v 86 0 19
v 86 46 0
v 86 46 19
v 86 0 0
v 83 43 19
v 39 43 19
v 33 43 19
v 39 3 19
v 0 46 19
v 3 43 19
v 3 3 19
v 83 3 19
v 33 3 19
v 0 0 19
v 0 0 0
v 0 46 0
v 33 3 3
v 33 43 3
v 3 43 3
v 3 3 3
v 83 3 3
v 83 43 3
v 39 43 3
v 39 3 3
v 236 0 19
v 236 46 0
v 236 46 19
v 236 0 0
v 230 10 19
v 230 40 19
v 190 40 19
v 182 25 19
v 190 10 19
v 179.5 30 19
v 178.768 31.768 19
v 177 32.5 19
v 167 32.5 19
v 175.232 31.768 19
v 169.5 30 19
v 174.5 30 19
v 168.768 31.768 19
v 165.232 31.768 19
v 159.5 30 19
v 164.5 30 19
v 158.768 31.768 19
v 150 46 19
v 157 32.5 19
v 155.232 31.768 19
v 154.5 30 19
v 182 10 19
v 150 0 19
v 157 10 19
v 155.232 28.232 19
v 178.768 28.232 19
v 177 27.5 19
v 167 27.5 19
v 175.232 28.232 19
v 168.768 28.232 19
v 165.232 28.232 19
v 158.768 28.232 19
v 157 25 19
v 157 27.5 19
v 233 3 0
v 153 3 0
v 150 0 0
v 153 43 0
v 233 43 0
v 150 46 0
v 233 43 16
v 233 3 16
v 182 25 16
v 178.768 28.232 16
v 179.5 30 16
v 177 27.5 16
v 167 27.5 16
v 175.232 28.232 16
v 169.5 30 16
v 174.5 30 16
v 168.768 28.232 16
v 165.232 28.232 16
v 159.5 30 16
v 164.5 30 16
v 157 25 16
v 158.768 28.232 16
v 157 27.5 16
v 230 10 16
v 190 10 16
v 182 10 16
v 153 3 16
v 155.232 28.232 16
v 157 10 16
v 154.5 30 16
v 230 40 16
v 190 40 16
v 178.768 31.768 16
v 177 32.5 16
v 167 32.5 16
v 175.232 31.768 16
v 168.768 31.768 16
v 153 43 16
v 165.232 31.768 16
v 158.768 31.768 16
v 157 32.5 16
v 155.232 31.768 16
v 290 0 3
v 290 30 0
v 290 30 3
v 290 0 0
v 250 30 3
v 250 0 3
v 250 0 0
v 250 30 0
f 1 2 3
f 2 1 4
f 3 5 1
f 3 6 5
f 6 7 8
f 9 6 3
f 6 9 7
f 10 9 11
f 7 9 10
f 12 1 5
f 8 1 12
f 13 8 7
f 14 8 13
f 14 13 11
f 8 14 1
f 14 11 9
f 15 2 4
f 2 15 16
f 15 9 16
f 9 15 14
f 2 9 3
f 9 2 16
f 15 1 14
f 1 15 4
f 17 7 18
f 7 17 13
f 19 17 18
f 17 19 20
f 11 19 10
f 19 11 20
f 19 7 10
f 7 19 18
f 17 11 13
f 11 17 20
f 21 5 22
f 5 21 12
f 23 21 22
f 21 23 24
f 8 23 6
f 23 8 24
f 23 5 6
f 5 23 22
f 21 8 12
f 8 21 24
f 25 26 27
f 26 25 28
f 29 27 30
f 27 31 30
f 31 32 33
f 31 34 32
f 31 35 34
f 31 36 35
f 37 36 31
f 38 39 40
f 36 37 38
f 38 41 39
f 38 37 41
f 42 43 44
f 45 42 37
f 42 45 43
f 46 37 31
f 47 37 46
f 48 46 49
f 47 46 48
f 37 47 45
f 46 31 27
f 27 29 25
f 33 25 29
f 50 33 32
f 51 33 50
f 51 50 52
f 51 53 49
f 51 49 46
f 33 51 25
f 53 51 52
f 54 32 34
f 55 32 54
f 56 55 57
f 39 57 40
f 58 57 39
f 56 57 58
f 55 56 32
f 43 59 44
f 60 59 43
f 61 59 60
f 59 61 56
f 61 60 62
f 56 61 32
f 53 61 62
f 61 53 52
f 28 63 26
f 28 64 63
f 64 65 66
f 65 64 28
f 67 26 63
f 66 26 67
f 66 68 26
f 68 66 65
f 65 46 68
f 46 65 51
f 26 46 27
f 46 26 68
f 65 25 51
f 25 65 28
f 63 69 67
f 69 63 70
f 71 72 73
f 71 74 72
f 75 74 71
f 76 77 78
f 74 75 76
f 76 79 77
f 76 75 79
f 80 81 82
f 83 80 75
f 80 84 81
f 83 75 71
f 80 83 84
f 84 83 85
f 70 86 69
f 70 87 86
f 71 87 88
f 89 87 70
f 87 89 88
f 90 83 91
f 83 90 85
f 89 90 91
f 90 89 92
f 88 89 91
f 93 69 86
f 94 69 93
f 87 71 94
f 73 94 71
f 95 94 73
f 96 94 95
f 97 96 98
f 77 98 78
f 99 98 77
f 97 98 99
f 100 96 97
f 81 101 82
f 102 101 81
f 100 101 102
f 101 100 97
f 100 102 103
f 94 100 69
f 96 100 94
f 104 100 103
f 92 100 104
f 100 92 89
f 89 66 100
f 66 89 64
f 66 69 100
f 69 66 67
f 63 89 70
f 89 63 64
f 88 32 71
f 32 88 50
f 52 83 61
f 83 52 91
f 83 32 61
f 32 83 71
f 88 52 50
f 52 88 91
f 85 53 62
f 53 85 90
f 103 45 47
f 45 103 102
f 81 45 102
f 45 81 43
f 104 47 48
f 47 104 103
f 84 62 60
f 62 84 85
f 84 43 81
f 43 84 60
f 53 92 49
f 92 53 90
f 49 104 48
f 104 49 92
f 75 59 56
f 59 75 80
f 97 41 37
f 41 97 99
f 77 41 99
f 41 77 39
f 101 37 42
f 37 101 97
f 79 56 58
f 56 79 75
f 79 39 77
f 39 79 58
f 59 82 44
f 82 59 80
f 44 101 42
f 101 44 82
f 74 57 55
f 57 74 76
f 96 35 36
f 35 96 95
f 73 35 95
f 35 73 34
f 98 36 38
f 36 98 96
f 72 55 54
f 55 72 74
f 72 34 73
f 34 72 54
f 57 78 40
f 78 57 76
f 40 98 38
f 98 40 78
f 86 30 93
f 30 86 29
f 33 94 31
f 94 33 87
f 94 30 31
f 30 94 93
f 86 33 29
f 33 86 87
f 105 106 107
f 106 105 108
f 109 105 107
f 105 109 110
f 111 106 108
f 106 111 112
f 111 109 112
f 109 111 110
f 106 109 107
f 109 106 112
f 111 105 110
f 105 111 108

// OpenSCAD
length = 86;
width= 46;
height = 19;
length2=30;
lengtho2=44;
width2=40;
lengthtwo=80;

height2=16;


height20 = 19;

height22=16;
lengthhole=25;
length2hole=40;
widthhole=15;
width2hole= 30;
heighthole=3;
dhole=5;
depthhole=3;

difference() {
    difference() {
                
                translate([0, 0, 0]){
                    cube(size=[length, width, height],center=false); 
                }
                translate([3,3,3]) {
                    cube(size=[length2, width2, height2], center=false); 
                }
        
    }
    //translate([83,22.5,3]){
       // cylinder(depthhole,dhole/2,dhole/2,center=false);
    //}
    translate([39,3,3]) {
                    cube(size=[lengtho2, width2, height2], center=false); 
                }
}
difference(){
    difference(){
        difference() {
                    
                    translate([150, 0, 0]){
                        cube(size=[length, width, height20],center=false); 
                    }
                    translate([153,3,0]) {
                        cube(size=[lengthtwo, width2, height22], center=false); 
                    }
            
        }
        translate([157,10,16]){
            cube(size=[lengthhole,widthhole,heighthole],center=false);
        }
         translate([157,30,16]){
            cylinder(depthhole,dhole/2,dhole/2,center=false);
        }
        translate([167,30,16]){
            cylinder(depthhole,dhole/2,dhole/2,center=false);
        }
        translate([177,30,16]){
            cylinder(depthhole,dhole/2,dhole/2,center=false);
        }
        translate([190,10,16]){
            cube(size=[length2hole,width2hole,heighthole],center=false);
        }
    
   
    }
    translate([190,10,15]){
            cube(size=[length2hole,width2hole,heighthole],center=false);
        }
}

translate([250,0,0]){
            cube(size=[length2hole,width2hole,heighthole],center=false);
        }
